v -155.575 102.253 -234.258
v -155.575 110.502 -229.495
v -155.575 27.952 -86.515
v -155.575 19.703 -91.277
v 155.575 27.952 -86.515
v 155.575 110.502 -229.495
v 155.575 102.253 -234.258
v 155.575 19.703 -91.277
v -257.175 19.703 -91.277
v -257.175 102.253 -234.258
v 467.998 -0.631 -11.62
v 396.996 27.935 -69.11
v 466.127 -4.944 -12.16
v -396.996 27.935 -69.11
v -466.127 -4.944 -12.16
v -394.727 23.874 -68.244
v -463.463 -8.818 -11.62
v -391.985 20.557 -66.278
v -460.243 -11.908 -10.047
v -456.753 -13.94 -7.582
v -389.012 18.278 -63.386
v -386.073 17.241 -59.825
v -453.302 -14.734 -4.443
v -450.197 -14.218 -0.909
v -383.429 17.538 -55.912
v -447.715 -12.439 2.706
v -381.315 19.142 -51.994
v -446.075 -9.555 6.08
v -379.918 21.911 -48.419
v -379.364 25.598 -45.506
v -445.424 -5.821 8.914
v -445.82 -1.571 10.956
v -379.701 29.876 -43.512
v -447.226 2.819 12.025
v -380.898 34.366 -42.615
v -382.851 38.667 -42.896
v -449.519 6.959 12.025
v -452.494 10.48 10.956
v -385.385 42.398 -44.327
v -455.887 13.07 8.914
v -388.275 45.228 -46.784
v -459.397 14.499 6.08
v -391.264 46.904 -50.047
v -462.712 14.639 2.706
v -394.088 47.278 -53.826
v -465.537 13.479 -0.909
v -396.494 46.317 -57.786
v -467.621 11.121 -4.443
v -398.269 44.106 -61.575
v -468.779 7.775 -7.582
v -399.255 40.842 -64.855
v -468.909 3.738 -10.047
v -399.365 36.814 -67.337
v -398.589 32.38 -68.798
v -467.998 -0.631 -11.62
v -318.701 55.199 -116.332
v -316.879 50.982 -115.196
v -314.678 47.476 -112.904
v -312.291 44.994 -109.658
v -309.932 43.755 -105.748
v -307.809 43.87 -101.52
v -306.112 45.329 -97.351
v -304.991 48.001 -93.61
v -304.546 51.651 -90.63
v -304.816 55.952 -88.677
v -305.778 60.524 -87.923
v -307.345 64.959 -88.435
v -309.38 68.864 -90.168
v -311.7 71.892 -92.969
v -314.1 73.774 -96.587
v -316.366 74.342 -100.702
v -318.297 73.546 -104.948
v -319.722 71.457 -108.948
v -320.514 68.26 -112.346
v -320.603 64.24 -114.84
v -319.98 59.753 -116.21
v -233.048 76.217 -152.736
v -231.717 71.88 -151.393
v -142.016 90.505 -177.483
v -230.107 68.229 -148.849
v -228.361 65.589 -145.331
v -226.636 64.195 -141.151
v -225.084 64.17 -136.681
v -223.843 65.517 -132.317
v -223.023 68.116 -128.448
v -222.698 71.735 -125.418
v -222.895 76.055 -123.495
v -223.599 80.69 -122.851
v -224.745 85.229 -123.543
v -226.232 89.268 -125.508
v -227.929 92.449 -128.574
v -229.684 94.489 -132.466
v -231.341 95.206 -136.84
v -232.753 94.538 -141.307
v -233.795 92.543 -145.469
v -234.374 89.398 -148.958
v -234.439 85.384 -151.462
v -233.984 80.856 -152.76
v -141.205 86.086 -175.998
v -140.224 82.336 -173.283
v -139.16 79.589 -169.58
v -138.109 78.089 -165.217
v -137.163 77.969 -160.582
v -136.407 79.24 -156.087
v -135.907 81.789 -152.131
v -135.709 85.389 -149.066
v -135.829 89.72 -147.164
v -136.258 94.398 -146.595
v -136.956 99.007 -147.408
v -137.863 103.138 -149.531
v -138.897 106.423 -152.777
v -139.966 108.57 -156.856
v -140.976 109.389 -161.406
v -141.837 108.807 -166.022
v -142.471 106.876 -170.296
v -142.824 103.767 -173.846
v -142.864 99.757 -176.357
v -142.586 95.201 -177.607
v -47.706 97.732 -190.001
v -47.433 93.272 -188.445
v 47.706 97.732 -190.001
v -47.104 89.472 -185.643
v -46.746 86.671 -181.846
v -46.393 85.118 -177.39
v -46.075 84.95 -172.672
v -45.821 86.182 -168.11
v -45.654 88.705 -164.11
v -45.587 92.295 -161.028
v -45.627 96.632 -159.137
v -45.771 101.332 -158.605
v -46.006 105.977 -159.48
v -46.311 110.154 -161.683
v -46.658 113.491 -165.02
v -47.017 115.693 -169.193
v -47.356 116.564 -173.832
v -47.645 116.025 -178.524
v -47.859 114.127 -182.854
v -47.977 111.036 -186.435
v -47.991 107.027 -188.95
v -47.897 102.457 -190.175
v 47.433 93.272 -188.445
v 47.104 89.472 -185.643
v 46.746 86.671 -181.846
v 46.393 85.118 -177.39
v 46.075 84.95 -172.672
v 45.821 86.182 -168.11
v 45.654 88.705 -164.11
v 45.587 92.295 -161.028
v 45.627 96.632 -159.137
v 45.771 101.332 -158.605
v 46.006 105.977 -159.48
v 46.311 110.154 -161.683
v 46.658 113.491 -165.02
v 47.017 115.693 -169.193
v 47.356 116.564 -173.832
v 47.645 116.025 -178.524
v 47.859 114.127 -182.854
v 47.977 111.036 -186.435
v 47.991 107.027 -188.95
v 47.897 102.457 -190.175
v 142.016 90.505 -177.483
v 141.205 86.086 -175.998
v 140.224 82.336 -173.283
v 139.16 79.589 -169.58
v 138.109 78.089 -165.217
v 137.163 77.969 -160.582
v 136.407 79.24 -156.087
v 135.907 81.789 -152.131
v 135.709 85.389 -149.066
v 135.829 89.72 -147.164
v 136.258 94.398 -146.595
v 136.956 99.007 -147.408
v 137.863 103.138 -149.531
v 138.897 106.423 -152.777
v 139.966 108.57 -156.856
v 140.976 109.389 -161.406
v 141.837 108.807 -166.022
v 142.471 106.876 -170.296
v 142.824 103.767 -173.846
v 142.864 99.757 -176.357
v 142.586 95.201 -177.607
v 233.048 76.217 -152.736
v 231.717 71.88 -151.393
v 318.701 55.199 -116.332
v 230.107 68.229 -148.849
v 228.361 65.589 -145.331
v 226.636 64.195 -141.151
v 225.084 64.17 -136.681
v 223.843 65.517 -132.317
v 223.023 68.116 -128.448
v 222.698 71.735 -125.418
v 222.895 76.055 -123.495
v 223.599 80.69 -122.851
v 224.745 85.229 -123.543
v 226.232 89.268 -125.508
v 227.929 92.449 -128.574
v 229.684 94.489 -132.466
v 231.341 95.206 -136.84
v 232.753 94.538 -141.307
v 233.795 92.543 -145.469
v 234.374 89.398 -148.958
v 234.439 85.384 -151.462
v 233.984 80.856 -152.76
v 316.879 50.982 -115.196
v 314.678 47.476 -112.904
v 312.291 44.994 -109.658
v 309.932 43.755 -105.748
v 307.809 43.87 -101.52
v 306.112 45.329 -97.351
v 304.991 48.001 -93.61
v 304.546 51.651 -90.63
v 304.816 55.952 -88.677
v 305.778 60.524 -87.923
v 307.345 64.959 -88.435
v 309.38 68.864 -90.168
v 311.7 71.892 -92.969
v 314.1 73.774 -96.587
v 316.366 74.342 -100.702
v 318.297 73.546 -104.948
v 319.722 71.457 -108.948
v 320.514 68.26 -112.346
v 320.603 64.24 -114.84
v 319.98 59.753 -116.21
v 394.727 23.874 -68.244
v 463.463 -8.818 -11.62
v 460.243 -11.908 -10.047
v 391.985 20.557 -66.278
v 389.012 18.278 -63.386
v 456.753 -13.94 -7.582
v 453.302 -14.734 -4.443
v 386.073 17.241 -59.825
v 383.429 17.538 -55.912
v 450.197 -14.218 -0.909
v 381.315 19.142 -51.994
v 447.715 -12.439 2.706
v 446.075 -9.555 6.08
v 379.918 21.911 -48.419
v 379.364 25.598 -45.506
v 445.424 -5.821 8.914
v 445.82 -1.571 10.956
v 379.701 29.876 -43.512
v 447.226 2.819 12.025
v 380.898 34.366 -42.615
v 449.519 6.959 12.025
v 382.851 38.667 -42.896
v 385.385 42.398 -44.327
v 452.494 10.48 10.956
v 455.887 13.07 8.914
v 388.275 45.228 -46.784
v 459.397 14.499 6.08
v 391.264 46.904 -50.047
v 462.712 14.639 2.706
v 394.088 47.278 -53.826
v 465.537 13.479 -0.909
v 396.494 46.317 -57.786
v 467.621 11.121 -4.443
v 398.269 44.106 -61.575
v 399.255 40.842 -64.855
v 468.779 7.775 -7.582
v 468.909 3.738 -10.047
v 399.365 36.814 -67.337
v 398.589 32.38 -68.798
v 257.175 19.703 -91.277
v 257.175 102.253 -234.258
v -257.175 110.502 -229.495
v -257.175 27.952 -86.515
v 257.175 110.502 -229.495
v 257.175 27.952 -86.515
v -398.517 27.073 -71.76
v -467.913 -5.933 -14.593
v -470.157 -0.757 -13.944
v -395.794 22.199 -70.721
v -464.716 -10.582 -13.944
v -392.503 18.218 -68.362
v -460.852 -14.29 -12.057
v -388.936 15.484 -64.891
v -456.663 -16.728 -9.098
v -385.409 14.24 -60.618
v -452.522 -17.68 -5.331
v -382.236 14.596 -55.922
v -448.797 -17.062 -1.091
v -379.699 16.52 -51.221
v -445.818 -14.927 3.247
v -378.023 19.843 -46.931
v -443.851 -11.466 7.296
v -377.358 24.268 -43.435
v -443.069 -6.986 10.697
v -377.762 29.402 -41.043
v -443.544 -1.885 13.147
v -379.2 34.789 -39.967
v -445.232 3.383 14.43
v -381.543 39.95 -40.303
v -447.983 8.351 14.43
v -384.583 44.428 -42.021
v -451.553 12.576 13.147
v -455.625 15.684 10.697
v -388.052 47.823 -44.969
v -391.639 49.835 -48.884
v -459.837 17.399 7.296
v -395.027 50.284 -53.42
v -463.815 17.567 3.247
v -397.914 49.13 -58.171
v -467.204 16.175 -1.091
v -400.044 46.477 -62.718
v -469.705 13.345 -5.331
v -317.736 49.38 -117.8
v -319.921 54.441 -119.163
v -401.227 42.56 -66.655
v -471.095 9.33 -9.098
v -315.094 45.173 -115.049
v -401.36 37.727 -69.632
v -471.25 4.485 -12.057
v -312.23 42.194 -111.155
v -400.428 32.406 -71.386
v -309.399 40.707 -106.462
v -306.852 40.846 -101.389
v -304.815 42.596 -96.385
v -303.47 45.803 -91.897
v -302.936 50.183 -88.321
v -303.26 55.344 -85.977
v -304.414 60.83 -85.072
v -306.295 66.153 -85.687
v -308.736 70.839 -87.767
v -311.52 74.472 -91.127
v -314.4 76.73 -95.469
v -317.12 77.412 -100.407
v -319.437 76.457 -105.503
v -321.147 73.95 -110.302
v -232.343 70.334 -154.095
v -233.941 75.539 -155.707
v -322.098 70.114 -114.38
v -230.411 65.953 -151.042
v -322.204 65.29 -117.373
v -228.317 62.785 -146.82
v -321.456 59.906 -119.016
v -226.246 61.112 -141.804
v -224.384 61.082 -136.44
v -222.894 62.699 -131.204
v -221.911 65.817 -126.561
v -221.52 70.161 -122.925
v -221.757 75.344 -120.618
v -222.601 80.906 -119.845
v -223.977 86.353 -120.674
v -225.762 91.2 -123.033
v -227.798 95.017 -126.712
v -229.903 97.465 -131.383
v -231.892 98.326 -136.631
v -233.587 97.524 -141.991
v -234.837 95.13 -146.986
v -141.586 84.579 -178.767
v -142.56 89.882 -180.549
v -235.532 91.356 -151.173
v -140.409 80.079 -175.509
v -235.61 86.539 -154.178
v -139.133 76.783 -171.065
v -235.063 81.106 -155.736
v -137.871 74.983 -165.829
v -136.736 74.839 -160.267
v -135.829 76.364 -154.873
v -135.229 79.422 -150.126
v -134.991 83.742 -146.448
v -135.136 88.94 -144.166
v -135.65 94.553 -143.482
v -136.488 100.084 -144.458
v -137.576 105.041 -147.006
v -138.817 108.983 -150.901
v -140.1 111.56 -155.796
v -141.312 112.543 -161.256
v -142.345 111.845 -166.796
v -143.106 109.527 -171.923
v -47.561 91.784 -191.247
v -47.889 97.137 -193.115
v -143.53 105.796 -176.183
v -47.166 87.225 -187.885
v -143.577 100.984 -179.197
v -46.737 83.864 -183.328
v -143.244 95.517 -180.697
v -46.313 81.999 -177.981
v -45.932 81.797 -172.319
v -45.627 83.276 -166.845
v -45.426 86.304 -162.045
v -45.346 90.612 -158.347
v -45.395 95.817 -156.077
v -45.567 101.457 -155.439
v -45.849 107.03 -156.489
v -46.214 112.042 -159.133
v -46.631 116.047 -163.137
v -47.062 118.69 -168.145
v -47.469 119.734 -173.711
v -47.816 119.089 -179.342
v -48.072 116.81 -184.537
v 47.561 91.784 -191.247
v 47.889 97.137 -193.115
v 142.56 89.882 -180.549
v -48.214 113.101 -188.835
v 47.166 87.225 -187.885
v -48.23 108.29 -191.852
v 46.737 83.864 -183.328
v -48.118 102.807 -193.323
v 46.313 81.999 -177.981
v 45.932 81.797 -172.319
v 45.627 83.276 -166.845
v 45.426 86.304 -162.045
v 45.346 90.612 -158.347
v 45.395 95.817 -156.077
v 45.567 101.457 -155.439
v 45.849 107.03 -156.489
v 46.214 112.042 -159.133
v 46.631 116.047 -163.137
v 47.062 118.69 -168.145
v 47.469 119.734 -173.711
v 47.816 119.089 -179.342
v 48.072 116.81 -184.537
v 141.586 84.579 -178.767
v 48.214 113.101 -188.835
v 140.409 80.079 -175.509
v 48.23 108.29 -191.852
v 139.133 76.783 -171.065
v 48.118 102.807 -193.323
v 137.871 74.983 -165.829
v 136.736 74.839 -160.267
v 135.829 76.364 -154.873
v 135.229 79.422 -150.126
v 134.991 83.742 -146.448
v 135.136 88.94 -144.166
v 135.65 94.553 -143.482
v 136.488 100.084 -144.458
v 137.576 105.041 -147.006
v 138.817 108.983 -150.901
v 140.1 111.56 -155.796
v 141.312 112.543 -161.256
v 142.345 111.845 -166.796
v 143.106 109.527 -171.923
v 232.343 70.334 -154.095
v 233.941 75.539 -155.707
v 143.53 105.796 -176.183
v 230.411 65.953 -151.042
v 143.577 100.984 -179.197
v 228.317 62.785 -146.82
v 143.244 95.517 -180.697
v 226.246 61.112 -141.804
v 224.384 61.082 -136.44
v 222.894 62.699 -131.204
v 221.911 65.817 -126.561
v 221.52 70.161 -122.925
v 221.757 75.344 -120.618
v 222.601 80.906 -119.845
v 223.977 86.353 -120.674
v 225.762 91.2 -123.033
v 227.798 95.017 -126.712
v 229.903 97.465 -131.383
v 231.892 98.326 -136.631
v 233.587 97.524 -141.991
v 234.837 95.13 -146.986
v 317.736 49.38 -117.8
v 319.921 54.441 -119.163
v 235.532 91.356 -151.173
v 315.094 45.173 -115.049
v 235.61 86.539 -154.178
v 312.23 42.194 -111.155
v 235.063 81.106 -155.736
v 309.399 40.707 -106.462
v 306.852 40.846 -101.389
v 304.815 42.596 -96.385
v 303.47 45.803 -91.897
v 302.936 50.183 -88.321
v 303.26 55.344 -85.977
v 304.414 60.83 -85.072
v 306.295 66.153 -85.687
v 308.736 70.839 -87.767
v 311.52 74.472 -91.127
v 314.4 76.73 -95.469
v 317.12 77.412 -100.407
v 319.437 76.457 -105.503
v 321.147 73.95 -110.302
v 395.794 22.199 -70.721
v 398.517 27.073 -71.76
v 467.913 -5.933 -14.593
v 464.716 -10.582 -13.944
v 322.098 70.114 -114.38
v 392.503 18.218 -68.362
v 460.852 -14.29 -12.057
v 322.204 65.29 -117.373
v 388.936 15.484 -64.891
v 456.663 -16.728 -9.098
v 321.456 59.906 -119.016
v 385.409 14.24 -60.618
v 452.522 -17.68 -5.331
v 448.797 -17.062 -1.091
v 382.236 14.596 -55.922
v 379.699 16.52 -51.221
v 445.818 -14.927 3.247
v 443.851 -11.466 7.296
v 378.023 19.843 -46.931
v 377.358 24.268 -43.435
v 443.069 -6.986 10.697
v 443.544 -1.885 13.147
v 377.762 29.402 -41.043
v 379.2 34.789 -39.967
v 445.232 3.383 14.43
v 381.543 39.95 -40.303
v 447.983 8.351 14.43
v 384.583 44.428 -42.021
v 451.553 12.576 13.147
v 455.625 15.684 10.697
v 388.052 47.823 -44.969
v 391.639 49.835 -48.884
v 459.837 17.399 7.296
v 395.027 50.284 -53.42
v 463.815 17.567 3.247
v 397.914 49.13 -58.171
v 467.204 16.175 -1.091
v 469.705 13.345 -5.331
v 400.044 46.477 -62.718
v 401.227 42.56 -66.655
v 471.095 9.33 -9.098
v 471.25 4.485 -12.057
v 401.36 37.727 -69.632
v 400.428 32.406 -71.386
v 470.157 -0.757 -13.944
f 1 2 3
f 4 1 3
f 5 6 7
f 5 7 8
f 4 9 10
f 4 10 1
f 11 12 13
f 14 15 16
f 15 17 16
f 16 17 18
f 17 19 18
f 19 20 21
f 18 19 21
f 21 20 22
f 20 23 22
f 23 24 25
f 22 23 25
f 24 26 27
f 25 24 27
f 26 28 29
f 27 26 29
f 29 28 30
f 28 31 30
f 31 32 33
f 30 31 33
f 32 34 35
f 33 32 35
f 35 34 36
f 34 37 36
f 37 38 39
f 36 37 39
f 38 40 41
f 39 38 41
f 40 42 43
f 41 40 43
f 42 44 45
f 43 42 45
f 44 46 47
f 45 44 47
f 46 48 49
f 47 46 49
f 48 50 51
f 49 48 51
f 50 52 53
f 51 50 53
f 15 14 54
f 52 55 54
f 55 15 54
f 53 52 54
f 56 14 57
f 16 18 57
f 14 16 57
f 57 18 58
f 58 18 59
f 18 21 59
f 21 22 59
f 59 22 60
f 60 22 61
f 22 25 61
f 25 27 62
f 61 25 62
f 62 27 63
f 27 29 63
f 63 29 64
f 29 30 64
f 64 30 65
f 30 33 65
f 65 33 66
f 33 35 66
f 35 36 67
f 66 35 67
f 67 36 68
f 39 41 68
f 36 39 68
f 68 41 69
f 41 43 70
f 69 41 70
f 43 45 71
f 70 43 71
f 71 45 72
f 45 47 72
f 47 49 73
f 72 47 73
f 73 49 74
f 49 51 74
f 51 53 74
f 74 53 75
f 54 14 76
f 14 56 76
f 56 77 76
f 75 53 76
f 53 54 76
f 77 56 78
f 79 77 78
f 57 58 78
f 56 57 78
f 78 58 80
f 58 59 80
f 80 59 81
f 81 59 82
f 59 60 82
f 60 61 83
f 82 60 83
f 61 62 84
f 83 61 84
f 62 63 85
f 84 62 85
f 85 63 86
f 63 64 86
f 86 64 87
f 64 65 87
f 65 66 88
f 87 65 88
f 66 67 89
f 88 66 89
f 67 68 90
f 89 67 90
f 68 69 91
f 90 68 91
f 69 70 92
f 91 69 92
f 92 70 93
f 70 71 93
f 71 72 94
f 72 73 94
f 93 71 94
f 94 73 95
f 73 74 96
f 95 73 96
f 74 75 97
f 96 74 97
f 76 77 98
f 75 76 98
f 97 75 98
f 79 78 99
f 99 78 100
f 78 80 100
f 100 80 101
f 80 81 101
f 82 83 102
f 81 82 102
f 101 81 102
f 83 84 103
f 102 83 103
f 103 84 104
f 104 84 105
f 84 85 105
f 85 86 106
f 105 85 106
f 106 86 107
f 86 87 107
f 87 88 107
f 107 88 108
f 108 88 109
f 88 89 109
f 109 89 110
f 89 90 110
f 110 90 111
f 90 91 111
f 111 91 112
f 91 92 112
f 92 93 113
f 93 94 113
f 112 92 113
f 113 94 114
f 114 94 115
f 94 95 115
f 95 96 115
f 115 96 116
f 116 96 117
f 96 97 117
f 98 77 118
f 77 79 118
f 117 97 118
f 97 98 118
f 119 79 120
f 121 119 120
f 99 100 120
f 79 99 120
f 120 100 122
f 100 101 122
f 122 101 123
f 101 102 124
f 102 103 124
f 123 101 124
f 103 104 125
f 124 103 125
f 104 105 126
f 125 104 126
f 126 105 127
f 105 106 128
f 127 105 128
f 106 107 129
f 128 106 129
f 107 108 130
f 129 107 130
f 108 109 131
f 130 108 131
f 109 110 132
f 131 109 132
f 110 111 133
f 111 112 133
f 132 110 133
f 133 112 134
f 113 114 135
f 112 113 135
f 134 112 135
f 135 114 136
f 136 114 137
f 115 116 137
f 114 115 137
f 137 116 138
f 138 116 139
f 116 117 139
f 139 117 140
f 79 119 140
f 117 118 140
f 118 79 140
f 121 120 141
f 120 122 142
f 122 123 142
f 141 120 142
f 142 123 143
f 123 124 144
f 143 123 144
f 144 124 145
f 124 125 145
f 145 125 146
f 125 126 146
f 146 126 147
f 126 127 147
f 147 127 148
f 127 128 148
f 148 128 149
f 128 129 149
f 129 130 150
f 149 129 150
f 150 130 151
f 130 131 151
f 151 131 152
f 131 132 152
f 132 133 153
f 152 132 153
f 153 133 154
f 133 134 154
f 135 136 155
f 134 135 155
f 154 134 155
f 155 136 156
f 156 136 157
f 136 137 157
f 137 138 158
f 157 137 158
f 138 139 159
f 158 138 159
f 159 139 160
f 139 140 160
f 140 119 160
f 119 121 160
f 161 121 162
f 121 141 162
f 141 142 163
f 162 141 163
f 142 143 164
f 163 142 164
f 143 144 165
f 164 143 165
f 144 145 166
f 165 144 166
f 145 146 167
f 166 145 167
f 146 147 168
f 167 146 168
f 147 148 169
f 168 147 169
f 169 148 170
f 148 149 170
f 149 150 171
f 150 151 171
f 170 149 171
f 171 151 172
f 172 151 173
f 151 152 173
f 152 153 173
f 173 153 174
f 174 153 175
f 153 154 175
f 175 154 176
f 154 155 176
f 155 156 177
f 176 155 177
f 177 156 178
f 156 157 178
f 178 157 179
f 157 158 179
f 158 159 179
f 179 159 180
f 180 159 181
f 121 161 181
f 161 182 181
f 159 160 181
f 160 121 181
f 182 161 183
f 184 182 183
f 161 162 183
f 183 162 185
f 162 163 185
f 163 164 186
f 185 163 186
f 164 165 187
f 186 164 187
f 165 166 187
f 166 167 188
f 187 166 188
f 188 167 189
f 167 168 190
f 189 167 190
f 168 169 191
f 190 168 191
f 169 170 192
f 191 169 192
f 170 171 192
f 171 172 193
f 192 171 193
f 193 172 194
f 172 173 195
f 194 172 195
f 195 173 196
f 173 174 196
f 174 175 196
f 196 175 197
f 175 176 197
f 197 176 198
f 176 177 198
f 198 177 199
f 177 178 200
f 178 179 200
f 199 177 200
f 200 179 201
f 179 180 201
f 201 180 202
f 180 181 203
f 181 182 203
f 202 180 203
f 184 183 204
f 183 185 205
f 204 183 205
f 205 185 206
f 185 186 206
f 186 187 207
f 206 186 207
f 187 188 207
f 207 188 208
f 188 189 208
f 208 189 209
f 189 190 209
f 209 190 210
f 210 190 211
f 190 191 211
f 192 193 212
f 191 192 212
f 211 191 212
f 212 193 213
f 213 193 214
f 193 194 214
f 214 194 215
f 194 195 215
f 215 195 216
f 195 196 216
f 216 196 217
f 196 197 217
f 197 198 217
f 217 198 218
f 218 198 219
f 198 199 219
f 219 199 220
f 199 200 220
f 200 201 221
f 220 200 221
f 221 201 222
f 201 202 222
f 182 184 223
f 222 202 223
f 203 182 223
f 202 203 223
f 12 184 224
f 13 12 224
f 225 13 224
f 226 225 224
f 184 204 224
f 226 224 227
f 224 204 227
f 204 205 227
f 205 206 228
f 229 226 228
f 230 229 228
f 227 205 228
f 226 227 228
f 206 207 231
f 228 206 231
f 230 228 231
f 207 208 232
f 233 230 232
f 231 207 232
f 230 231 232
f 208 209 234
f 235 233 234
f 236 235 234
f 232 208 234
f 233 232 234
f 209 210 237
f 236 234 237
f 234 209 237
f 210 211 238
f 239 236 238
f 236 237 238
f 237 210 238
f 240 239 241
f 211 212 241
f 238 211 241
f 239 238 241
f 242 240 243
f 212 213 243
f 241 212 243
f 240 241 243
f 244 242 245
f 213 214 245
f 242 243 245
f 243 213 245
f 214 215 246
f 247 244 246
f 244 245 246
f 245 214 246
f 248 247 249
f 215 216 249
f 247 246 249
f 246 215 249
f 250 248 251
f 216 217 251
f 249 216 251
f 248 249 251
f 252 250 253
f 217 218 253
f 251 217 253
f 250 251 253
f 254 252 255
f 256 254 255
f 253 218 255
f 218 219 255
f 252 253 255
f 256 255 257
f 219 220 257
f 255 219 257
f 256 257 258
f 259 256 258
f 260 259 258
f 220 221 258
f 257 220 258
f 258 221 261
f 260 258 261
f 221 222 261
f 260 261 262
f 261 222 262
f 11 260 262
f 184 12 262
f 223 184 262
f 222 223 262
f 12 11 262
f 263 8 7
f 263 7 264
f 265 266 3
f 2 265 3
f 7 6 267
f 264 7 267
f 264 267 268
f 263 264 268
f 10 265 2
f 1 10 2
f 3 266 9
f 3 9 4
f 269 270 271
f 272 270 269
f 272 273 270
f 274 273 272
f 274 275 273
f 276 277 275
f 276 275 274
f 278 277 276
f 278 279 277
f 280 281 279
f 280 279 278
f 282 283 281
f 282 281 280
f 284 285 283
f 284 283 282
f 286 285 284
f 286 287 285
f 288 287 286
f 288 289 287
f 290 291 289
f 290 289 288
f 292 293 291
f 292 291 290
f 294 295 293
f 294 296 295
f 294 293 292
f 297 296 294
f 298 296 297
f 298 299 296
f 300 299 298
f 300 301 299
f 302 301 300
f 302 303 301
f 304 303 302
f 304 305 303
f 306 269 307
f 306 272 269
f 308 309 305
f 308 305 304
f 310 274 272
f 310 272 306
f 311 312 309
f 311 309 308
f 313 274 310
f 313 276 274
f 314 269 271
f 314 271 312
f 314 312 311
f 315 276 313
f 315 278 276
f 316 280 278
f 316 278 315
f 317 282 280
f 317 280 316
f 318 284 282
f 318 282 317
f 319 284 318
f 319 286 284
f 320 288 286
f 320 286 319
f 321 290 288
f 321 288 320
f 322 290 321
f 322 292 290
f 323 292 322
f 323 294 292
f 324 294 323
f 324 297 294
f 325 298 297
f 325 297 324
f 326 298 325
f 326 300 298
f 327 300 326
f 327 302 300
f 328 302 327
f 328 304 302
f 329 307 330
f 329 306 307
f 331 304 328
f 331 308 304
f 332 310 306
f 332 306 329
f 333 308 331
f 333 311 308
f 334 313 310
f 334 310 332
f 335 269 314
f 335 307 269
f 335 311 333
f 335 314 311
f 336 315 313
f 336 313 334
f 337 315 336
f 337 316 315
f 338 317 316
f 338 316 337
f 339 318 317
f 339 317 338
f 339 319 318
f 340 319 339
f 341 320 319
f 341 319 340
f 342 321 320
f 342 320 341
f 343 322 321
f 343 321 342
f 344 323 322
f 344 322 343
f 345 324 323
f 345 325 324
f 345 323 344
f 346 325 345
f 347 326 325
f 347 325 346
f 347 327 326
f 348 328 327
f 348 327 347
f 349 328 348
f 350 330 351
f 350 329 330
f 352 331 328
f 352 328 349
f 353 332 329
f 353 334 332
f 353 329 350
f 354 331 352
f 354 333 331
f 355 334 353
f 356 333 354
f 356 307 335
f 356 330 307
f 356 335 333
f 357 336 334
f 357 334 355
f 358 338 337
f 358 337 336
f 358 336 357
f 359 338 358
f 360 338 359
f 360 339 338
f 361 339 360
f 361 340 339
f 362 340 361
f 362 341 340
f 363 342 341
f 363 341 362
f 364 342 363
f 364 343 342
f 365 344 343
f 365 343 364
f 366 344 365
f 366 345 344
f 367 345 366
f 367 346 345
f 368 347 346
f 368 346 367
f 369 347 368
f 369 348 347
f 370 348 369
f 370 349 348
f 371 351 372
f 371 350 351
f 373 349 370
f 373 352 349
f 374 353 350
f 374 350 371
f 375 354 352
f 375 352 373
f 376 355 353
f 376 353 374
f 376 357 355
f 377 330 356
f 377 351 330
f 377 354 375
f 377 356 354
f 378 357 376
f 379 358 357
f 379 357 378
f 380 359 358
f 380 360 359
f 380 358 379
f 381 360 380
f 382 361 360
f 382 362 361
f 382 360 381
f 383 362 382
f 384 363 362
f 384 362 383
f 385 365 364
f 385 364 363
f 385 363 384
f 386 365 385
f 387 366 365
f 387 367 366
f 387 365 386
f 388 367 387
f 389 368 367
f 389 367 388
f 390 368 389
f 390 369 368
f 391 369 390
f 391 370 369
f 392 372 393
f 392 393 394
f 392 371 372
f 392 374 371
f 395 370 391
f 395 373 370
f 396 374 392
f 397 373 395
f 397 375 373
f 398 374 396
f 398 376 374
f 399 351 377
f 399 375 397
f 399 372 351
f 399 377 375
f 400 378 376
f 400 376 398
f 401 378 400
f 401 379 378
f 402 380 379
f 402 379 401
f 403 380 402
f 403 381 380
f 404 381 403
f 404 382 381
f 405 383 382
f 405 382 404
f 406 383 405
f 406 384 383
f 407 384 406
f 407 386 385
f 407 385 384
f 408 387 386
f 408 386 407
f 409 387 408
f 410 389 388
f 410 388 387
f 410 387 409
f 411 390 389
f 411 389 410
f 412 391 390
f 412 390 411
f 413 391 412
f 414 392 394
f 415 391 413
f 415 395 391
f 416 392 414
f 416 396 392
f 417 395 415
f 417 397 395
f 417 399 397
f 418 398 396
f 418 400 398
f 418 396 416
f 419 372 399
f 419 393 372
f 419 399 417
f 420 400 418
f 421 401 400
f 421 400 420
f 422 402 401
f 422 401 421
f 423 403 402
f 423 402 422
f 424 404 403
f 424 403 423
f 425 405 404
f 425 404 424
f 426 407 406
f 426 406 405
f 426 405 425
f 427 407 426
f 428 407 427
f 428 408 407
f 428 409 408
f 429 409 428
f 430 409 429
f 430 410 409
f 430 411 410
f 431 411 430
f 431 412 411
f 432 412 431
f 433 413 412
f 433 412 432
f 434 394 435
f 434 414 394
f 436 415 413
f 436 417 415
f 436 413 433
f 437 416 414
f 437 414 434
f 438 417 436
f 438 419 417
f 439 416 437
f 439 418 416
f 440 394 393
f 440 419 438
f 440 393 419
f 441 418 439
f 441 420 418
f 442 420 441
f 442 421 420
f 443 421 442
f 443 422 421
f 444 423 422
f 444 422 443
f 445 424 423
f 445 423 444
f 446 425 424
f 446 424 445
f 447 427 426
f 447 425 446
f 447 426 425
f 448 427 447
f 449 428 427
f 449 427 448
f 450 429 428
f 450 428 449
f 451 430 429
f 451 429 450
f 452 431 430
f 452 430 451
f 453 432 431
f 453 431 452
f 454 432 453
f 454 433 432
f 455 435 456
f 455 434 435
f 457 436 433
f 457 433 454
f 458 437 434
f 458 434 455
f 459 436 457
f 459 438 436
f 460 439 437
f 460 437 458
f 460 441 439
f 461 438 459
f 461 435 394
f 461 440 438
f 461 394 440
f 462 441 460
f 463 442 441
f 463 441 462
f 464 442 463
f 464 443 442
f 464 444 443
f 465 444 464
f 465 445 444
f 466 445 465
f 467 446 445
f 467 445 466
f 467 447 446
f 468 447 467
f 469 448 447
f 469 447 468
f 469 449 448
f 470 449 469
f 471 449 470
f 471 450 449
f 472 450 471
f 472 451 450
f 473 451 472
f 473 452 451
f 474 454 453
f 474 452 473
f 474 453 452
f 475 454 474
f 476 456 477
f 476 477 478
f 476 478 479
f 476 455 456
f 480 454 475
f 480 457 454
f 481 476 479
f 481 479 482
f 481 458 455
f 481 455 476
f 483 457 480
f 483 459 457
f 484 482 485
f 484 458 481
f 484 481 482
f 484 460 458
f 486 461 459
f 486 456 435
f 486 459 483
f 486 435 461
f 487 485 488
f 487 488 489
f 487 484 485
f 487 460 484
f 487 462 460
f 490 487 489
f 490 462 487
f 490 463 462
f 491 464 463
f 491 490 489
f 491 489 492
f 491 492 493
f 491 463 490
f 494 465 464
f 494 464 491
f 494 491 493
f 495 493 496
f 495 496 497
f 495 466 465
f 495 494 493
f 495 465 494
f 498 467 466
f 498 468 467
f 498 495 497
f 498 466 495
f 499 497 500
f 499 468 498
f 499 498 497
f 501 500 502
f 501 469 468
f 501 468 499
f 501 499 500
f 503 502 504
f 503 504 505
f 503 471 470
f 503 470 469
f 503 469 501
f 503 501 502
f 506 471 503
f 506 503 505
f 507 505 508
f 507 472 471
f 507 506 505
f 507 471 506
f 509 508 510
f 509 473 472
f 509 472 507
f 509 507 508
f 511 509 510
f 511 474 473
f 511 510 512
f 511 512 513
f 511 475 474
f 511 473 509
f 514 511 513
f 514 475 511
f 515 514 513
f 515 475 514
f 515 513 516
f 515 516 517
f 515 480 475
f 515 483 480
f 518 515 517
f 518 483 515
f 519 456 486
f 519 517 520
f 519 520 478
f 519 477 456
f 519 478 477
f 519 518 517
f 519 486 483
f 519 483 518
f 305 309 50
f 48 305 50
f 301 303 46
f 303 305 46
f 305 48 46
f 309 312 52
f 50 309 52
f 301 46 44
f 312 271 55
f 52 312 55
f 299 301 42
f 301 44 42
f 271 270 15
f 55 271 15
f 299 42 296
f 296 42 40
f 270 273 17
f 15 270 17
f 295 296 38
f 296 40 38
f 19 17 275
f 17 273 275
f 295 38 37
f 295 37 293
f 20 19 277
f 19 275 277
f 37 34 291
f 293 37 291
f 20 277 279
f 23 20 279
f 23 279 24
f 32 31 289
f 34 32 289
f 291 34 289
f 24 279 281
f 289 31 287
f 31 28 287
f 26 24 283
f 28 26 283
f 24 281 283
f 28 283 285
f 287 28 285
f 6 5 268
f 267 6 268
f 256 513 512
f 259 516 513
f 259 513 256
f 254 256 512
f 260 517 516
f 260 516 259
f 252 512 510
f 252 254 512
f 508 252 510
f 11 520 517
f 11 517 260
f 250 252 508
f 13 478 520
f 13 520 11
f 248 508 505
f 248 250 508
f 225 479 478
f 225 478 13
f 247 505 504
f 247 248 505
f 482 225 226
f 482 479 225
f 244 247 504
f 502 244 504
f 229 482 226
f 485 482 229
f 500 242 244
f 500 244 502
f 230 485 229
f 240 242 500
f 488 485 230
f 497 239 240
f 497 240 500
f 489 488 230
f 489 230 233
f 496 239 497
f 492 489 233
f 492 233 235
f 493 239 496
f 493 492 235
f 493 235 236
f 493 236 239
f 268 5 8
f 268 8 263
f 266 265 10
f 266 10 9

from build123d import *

# Parameters (mm, degrees)
SKETCH6_R        = 19.05
SKETCH6_R_2      = 15.875
SKETCH7_W        = 101.6
SKETCH7_H        = 165.1
EXTRUDE1_DEPTH   = 9.525
EXTRUDE1_2_DEPTH = 9.525


with BuildPart() as part:
    # Sweep2: sweep along a path in Sketch5
    with BuildLine(Plane(origin=(0, 0, 0), x_dir=(1, 0, 0), z_dir=(0, -0.8660254037844386, -0.4999999999999999))) as sweep2_path:
        ThreePointArc((-457.2, 0), (0, -203.2), (457.2, 0))
    # Sketch6 → Sweep2 (sweep)
    with BuildSketch(Plane(origin=(457.2, 0, 0), x_dir=(0.5623359865096149, -0.31144762329763287, -0.766014762402471), z_dir=(0.6701030927835051, -0.37113402061855666, 0.6428229801286556))):
        Circle(SKETCH6_R)
        Circle(SKETCH6_R_2, mode=Mode.SUBTRACT)
    sweep(path=sweep2_path.line)


with BuildPart() as body_2:
    # Sketch7 → Extrude1 (new body)
    with BuildSketch(Plane(origin=(0, -16.497783942, -9.525), x_dir=(1, 0, 0), z_dir=(0, -0.8660254037844387, -0.49999999999999983))):
        with Locations((-206.375, -171.45)):
            Rectangle(SKETCH7_W, SKETCH7_H)
    extrude(amount=EXTRUDE1_DEPTH)


with BuildPart() as body_3:
    # Sketch7 → Extrude1 2 (new body)
    with BuildSketch(Plane(origin=(0, -16.497783942, -9.525), x_dir=(1, 0, 0), z_dir=(0, -0.8660254037844387, -0.49999999999999983))):
        with Locations((206.375, -171.45)):
            Rectangle(SKETCH7_W, SKETCH7_H)
    extrude(amount=EXTRUDE1_2_DEPTH)


solid = Compound([part.part, body_2.part, body_3.part])
